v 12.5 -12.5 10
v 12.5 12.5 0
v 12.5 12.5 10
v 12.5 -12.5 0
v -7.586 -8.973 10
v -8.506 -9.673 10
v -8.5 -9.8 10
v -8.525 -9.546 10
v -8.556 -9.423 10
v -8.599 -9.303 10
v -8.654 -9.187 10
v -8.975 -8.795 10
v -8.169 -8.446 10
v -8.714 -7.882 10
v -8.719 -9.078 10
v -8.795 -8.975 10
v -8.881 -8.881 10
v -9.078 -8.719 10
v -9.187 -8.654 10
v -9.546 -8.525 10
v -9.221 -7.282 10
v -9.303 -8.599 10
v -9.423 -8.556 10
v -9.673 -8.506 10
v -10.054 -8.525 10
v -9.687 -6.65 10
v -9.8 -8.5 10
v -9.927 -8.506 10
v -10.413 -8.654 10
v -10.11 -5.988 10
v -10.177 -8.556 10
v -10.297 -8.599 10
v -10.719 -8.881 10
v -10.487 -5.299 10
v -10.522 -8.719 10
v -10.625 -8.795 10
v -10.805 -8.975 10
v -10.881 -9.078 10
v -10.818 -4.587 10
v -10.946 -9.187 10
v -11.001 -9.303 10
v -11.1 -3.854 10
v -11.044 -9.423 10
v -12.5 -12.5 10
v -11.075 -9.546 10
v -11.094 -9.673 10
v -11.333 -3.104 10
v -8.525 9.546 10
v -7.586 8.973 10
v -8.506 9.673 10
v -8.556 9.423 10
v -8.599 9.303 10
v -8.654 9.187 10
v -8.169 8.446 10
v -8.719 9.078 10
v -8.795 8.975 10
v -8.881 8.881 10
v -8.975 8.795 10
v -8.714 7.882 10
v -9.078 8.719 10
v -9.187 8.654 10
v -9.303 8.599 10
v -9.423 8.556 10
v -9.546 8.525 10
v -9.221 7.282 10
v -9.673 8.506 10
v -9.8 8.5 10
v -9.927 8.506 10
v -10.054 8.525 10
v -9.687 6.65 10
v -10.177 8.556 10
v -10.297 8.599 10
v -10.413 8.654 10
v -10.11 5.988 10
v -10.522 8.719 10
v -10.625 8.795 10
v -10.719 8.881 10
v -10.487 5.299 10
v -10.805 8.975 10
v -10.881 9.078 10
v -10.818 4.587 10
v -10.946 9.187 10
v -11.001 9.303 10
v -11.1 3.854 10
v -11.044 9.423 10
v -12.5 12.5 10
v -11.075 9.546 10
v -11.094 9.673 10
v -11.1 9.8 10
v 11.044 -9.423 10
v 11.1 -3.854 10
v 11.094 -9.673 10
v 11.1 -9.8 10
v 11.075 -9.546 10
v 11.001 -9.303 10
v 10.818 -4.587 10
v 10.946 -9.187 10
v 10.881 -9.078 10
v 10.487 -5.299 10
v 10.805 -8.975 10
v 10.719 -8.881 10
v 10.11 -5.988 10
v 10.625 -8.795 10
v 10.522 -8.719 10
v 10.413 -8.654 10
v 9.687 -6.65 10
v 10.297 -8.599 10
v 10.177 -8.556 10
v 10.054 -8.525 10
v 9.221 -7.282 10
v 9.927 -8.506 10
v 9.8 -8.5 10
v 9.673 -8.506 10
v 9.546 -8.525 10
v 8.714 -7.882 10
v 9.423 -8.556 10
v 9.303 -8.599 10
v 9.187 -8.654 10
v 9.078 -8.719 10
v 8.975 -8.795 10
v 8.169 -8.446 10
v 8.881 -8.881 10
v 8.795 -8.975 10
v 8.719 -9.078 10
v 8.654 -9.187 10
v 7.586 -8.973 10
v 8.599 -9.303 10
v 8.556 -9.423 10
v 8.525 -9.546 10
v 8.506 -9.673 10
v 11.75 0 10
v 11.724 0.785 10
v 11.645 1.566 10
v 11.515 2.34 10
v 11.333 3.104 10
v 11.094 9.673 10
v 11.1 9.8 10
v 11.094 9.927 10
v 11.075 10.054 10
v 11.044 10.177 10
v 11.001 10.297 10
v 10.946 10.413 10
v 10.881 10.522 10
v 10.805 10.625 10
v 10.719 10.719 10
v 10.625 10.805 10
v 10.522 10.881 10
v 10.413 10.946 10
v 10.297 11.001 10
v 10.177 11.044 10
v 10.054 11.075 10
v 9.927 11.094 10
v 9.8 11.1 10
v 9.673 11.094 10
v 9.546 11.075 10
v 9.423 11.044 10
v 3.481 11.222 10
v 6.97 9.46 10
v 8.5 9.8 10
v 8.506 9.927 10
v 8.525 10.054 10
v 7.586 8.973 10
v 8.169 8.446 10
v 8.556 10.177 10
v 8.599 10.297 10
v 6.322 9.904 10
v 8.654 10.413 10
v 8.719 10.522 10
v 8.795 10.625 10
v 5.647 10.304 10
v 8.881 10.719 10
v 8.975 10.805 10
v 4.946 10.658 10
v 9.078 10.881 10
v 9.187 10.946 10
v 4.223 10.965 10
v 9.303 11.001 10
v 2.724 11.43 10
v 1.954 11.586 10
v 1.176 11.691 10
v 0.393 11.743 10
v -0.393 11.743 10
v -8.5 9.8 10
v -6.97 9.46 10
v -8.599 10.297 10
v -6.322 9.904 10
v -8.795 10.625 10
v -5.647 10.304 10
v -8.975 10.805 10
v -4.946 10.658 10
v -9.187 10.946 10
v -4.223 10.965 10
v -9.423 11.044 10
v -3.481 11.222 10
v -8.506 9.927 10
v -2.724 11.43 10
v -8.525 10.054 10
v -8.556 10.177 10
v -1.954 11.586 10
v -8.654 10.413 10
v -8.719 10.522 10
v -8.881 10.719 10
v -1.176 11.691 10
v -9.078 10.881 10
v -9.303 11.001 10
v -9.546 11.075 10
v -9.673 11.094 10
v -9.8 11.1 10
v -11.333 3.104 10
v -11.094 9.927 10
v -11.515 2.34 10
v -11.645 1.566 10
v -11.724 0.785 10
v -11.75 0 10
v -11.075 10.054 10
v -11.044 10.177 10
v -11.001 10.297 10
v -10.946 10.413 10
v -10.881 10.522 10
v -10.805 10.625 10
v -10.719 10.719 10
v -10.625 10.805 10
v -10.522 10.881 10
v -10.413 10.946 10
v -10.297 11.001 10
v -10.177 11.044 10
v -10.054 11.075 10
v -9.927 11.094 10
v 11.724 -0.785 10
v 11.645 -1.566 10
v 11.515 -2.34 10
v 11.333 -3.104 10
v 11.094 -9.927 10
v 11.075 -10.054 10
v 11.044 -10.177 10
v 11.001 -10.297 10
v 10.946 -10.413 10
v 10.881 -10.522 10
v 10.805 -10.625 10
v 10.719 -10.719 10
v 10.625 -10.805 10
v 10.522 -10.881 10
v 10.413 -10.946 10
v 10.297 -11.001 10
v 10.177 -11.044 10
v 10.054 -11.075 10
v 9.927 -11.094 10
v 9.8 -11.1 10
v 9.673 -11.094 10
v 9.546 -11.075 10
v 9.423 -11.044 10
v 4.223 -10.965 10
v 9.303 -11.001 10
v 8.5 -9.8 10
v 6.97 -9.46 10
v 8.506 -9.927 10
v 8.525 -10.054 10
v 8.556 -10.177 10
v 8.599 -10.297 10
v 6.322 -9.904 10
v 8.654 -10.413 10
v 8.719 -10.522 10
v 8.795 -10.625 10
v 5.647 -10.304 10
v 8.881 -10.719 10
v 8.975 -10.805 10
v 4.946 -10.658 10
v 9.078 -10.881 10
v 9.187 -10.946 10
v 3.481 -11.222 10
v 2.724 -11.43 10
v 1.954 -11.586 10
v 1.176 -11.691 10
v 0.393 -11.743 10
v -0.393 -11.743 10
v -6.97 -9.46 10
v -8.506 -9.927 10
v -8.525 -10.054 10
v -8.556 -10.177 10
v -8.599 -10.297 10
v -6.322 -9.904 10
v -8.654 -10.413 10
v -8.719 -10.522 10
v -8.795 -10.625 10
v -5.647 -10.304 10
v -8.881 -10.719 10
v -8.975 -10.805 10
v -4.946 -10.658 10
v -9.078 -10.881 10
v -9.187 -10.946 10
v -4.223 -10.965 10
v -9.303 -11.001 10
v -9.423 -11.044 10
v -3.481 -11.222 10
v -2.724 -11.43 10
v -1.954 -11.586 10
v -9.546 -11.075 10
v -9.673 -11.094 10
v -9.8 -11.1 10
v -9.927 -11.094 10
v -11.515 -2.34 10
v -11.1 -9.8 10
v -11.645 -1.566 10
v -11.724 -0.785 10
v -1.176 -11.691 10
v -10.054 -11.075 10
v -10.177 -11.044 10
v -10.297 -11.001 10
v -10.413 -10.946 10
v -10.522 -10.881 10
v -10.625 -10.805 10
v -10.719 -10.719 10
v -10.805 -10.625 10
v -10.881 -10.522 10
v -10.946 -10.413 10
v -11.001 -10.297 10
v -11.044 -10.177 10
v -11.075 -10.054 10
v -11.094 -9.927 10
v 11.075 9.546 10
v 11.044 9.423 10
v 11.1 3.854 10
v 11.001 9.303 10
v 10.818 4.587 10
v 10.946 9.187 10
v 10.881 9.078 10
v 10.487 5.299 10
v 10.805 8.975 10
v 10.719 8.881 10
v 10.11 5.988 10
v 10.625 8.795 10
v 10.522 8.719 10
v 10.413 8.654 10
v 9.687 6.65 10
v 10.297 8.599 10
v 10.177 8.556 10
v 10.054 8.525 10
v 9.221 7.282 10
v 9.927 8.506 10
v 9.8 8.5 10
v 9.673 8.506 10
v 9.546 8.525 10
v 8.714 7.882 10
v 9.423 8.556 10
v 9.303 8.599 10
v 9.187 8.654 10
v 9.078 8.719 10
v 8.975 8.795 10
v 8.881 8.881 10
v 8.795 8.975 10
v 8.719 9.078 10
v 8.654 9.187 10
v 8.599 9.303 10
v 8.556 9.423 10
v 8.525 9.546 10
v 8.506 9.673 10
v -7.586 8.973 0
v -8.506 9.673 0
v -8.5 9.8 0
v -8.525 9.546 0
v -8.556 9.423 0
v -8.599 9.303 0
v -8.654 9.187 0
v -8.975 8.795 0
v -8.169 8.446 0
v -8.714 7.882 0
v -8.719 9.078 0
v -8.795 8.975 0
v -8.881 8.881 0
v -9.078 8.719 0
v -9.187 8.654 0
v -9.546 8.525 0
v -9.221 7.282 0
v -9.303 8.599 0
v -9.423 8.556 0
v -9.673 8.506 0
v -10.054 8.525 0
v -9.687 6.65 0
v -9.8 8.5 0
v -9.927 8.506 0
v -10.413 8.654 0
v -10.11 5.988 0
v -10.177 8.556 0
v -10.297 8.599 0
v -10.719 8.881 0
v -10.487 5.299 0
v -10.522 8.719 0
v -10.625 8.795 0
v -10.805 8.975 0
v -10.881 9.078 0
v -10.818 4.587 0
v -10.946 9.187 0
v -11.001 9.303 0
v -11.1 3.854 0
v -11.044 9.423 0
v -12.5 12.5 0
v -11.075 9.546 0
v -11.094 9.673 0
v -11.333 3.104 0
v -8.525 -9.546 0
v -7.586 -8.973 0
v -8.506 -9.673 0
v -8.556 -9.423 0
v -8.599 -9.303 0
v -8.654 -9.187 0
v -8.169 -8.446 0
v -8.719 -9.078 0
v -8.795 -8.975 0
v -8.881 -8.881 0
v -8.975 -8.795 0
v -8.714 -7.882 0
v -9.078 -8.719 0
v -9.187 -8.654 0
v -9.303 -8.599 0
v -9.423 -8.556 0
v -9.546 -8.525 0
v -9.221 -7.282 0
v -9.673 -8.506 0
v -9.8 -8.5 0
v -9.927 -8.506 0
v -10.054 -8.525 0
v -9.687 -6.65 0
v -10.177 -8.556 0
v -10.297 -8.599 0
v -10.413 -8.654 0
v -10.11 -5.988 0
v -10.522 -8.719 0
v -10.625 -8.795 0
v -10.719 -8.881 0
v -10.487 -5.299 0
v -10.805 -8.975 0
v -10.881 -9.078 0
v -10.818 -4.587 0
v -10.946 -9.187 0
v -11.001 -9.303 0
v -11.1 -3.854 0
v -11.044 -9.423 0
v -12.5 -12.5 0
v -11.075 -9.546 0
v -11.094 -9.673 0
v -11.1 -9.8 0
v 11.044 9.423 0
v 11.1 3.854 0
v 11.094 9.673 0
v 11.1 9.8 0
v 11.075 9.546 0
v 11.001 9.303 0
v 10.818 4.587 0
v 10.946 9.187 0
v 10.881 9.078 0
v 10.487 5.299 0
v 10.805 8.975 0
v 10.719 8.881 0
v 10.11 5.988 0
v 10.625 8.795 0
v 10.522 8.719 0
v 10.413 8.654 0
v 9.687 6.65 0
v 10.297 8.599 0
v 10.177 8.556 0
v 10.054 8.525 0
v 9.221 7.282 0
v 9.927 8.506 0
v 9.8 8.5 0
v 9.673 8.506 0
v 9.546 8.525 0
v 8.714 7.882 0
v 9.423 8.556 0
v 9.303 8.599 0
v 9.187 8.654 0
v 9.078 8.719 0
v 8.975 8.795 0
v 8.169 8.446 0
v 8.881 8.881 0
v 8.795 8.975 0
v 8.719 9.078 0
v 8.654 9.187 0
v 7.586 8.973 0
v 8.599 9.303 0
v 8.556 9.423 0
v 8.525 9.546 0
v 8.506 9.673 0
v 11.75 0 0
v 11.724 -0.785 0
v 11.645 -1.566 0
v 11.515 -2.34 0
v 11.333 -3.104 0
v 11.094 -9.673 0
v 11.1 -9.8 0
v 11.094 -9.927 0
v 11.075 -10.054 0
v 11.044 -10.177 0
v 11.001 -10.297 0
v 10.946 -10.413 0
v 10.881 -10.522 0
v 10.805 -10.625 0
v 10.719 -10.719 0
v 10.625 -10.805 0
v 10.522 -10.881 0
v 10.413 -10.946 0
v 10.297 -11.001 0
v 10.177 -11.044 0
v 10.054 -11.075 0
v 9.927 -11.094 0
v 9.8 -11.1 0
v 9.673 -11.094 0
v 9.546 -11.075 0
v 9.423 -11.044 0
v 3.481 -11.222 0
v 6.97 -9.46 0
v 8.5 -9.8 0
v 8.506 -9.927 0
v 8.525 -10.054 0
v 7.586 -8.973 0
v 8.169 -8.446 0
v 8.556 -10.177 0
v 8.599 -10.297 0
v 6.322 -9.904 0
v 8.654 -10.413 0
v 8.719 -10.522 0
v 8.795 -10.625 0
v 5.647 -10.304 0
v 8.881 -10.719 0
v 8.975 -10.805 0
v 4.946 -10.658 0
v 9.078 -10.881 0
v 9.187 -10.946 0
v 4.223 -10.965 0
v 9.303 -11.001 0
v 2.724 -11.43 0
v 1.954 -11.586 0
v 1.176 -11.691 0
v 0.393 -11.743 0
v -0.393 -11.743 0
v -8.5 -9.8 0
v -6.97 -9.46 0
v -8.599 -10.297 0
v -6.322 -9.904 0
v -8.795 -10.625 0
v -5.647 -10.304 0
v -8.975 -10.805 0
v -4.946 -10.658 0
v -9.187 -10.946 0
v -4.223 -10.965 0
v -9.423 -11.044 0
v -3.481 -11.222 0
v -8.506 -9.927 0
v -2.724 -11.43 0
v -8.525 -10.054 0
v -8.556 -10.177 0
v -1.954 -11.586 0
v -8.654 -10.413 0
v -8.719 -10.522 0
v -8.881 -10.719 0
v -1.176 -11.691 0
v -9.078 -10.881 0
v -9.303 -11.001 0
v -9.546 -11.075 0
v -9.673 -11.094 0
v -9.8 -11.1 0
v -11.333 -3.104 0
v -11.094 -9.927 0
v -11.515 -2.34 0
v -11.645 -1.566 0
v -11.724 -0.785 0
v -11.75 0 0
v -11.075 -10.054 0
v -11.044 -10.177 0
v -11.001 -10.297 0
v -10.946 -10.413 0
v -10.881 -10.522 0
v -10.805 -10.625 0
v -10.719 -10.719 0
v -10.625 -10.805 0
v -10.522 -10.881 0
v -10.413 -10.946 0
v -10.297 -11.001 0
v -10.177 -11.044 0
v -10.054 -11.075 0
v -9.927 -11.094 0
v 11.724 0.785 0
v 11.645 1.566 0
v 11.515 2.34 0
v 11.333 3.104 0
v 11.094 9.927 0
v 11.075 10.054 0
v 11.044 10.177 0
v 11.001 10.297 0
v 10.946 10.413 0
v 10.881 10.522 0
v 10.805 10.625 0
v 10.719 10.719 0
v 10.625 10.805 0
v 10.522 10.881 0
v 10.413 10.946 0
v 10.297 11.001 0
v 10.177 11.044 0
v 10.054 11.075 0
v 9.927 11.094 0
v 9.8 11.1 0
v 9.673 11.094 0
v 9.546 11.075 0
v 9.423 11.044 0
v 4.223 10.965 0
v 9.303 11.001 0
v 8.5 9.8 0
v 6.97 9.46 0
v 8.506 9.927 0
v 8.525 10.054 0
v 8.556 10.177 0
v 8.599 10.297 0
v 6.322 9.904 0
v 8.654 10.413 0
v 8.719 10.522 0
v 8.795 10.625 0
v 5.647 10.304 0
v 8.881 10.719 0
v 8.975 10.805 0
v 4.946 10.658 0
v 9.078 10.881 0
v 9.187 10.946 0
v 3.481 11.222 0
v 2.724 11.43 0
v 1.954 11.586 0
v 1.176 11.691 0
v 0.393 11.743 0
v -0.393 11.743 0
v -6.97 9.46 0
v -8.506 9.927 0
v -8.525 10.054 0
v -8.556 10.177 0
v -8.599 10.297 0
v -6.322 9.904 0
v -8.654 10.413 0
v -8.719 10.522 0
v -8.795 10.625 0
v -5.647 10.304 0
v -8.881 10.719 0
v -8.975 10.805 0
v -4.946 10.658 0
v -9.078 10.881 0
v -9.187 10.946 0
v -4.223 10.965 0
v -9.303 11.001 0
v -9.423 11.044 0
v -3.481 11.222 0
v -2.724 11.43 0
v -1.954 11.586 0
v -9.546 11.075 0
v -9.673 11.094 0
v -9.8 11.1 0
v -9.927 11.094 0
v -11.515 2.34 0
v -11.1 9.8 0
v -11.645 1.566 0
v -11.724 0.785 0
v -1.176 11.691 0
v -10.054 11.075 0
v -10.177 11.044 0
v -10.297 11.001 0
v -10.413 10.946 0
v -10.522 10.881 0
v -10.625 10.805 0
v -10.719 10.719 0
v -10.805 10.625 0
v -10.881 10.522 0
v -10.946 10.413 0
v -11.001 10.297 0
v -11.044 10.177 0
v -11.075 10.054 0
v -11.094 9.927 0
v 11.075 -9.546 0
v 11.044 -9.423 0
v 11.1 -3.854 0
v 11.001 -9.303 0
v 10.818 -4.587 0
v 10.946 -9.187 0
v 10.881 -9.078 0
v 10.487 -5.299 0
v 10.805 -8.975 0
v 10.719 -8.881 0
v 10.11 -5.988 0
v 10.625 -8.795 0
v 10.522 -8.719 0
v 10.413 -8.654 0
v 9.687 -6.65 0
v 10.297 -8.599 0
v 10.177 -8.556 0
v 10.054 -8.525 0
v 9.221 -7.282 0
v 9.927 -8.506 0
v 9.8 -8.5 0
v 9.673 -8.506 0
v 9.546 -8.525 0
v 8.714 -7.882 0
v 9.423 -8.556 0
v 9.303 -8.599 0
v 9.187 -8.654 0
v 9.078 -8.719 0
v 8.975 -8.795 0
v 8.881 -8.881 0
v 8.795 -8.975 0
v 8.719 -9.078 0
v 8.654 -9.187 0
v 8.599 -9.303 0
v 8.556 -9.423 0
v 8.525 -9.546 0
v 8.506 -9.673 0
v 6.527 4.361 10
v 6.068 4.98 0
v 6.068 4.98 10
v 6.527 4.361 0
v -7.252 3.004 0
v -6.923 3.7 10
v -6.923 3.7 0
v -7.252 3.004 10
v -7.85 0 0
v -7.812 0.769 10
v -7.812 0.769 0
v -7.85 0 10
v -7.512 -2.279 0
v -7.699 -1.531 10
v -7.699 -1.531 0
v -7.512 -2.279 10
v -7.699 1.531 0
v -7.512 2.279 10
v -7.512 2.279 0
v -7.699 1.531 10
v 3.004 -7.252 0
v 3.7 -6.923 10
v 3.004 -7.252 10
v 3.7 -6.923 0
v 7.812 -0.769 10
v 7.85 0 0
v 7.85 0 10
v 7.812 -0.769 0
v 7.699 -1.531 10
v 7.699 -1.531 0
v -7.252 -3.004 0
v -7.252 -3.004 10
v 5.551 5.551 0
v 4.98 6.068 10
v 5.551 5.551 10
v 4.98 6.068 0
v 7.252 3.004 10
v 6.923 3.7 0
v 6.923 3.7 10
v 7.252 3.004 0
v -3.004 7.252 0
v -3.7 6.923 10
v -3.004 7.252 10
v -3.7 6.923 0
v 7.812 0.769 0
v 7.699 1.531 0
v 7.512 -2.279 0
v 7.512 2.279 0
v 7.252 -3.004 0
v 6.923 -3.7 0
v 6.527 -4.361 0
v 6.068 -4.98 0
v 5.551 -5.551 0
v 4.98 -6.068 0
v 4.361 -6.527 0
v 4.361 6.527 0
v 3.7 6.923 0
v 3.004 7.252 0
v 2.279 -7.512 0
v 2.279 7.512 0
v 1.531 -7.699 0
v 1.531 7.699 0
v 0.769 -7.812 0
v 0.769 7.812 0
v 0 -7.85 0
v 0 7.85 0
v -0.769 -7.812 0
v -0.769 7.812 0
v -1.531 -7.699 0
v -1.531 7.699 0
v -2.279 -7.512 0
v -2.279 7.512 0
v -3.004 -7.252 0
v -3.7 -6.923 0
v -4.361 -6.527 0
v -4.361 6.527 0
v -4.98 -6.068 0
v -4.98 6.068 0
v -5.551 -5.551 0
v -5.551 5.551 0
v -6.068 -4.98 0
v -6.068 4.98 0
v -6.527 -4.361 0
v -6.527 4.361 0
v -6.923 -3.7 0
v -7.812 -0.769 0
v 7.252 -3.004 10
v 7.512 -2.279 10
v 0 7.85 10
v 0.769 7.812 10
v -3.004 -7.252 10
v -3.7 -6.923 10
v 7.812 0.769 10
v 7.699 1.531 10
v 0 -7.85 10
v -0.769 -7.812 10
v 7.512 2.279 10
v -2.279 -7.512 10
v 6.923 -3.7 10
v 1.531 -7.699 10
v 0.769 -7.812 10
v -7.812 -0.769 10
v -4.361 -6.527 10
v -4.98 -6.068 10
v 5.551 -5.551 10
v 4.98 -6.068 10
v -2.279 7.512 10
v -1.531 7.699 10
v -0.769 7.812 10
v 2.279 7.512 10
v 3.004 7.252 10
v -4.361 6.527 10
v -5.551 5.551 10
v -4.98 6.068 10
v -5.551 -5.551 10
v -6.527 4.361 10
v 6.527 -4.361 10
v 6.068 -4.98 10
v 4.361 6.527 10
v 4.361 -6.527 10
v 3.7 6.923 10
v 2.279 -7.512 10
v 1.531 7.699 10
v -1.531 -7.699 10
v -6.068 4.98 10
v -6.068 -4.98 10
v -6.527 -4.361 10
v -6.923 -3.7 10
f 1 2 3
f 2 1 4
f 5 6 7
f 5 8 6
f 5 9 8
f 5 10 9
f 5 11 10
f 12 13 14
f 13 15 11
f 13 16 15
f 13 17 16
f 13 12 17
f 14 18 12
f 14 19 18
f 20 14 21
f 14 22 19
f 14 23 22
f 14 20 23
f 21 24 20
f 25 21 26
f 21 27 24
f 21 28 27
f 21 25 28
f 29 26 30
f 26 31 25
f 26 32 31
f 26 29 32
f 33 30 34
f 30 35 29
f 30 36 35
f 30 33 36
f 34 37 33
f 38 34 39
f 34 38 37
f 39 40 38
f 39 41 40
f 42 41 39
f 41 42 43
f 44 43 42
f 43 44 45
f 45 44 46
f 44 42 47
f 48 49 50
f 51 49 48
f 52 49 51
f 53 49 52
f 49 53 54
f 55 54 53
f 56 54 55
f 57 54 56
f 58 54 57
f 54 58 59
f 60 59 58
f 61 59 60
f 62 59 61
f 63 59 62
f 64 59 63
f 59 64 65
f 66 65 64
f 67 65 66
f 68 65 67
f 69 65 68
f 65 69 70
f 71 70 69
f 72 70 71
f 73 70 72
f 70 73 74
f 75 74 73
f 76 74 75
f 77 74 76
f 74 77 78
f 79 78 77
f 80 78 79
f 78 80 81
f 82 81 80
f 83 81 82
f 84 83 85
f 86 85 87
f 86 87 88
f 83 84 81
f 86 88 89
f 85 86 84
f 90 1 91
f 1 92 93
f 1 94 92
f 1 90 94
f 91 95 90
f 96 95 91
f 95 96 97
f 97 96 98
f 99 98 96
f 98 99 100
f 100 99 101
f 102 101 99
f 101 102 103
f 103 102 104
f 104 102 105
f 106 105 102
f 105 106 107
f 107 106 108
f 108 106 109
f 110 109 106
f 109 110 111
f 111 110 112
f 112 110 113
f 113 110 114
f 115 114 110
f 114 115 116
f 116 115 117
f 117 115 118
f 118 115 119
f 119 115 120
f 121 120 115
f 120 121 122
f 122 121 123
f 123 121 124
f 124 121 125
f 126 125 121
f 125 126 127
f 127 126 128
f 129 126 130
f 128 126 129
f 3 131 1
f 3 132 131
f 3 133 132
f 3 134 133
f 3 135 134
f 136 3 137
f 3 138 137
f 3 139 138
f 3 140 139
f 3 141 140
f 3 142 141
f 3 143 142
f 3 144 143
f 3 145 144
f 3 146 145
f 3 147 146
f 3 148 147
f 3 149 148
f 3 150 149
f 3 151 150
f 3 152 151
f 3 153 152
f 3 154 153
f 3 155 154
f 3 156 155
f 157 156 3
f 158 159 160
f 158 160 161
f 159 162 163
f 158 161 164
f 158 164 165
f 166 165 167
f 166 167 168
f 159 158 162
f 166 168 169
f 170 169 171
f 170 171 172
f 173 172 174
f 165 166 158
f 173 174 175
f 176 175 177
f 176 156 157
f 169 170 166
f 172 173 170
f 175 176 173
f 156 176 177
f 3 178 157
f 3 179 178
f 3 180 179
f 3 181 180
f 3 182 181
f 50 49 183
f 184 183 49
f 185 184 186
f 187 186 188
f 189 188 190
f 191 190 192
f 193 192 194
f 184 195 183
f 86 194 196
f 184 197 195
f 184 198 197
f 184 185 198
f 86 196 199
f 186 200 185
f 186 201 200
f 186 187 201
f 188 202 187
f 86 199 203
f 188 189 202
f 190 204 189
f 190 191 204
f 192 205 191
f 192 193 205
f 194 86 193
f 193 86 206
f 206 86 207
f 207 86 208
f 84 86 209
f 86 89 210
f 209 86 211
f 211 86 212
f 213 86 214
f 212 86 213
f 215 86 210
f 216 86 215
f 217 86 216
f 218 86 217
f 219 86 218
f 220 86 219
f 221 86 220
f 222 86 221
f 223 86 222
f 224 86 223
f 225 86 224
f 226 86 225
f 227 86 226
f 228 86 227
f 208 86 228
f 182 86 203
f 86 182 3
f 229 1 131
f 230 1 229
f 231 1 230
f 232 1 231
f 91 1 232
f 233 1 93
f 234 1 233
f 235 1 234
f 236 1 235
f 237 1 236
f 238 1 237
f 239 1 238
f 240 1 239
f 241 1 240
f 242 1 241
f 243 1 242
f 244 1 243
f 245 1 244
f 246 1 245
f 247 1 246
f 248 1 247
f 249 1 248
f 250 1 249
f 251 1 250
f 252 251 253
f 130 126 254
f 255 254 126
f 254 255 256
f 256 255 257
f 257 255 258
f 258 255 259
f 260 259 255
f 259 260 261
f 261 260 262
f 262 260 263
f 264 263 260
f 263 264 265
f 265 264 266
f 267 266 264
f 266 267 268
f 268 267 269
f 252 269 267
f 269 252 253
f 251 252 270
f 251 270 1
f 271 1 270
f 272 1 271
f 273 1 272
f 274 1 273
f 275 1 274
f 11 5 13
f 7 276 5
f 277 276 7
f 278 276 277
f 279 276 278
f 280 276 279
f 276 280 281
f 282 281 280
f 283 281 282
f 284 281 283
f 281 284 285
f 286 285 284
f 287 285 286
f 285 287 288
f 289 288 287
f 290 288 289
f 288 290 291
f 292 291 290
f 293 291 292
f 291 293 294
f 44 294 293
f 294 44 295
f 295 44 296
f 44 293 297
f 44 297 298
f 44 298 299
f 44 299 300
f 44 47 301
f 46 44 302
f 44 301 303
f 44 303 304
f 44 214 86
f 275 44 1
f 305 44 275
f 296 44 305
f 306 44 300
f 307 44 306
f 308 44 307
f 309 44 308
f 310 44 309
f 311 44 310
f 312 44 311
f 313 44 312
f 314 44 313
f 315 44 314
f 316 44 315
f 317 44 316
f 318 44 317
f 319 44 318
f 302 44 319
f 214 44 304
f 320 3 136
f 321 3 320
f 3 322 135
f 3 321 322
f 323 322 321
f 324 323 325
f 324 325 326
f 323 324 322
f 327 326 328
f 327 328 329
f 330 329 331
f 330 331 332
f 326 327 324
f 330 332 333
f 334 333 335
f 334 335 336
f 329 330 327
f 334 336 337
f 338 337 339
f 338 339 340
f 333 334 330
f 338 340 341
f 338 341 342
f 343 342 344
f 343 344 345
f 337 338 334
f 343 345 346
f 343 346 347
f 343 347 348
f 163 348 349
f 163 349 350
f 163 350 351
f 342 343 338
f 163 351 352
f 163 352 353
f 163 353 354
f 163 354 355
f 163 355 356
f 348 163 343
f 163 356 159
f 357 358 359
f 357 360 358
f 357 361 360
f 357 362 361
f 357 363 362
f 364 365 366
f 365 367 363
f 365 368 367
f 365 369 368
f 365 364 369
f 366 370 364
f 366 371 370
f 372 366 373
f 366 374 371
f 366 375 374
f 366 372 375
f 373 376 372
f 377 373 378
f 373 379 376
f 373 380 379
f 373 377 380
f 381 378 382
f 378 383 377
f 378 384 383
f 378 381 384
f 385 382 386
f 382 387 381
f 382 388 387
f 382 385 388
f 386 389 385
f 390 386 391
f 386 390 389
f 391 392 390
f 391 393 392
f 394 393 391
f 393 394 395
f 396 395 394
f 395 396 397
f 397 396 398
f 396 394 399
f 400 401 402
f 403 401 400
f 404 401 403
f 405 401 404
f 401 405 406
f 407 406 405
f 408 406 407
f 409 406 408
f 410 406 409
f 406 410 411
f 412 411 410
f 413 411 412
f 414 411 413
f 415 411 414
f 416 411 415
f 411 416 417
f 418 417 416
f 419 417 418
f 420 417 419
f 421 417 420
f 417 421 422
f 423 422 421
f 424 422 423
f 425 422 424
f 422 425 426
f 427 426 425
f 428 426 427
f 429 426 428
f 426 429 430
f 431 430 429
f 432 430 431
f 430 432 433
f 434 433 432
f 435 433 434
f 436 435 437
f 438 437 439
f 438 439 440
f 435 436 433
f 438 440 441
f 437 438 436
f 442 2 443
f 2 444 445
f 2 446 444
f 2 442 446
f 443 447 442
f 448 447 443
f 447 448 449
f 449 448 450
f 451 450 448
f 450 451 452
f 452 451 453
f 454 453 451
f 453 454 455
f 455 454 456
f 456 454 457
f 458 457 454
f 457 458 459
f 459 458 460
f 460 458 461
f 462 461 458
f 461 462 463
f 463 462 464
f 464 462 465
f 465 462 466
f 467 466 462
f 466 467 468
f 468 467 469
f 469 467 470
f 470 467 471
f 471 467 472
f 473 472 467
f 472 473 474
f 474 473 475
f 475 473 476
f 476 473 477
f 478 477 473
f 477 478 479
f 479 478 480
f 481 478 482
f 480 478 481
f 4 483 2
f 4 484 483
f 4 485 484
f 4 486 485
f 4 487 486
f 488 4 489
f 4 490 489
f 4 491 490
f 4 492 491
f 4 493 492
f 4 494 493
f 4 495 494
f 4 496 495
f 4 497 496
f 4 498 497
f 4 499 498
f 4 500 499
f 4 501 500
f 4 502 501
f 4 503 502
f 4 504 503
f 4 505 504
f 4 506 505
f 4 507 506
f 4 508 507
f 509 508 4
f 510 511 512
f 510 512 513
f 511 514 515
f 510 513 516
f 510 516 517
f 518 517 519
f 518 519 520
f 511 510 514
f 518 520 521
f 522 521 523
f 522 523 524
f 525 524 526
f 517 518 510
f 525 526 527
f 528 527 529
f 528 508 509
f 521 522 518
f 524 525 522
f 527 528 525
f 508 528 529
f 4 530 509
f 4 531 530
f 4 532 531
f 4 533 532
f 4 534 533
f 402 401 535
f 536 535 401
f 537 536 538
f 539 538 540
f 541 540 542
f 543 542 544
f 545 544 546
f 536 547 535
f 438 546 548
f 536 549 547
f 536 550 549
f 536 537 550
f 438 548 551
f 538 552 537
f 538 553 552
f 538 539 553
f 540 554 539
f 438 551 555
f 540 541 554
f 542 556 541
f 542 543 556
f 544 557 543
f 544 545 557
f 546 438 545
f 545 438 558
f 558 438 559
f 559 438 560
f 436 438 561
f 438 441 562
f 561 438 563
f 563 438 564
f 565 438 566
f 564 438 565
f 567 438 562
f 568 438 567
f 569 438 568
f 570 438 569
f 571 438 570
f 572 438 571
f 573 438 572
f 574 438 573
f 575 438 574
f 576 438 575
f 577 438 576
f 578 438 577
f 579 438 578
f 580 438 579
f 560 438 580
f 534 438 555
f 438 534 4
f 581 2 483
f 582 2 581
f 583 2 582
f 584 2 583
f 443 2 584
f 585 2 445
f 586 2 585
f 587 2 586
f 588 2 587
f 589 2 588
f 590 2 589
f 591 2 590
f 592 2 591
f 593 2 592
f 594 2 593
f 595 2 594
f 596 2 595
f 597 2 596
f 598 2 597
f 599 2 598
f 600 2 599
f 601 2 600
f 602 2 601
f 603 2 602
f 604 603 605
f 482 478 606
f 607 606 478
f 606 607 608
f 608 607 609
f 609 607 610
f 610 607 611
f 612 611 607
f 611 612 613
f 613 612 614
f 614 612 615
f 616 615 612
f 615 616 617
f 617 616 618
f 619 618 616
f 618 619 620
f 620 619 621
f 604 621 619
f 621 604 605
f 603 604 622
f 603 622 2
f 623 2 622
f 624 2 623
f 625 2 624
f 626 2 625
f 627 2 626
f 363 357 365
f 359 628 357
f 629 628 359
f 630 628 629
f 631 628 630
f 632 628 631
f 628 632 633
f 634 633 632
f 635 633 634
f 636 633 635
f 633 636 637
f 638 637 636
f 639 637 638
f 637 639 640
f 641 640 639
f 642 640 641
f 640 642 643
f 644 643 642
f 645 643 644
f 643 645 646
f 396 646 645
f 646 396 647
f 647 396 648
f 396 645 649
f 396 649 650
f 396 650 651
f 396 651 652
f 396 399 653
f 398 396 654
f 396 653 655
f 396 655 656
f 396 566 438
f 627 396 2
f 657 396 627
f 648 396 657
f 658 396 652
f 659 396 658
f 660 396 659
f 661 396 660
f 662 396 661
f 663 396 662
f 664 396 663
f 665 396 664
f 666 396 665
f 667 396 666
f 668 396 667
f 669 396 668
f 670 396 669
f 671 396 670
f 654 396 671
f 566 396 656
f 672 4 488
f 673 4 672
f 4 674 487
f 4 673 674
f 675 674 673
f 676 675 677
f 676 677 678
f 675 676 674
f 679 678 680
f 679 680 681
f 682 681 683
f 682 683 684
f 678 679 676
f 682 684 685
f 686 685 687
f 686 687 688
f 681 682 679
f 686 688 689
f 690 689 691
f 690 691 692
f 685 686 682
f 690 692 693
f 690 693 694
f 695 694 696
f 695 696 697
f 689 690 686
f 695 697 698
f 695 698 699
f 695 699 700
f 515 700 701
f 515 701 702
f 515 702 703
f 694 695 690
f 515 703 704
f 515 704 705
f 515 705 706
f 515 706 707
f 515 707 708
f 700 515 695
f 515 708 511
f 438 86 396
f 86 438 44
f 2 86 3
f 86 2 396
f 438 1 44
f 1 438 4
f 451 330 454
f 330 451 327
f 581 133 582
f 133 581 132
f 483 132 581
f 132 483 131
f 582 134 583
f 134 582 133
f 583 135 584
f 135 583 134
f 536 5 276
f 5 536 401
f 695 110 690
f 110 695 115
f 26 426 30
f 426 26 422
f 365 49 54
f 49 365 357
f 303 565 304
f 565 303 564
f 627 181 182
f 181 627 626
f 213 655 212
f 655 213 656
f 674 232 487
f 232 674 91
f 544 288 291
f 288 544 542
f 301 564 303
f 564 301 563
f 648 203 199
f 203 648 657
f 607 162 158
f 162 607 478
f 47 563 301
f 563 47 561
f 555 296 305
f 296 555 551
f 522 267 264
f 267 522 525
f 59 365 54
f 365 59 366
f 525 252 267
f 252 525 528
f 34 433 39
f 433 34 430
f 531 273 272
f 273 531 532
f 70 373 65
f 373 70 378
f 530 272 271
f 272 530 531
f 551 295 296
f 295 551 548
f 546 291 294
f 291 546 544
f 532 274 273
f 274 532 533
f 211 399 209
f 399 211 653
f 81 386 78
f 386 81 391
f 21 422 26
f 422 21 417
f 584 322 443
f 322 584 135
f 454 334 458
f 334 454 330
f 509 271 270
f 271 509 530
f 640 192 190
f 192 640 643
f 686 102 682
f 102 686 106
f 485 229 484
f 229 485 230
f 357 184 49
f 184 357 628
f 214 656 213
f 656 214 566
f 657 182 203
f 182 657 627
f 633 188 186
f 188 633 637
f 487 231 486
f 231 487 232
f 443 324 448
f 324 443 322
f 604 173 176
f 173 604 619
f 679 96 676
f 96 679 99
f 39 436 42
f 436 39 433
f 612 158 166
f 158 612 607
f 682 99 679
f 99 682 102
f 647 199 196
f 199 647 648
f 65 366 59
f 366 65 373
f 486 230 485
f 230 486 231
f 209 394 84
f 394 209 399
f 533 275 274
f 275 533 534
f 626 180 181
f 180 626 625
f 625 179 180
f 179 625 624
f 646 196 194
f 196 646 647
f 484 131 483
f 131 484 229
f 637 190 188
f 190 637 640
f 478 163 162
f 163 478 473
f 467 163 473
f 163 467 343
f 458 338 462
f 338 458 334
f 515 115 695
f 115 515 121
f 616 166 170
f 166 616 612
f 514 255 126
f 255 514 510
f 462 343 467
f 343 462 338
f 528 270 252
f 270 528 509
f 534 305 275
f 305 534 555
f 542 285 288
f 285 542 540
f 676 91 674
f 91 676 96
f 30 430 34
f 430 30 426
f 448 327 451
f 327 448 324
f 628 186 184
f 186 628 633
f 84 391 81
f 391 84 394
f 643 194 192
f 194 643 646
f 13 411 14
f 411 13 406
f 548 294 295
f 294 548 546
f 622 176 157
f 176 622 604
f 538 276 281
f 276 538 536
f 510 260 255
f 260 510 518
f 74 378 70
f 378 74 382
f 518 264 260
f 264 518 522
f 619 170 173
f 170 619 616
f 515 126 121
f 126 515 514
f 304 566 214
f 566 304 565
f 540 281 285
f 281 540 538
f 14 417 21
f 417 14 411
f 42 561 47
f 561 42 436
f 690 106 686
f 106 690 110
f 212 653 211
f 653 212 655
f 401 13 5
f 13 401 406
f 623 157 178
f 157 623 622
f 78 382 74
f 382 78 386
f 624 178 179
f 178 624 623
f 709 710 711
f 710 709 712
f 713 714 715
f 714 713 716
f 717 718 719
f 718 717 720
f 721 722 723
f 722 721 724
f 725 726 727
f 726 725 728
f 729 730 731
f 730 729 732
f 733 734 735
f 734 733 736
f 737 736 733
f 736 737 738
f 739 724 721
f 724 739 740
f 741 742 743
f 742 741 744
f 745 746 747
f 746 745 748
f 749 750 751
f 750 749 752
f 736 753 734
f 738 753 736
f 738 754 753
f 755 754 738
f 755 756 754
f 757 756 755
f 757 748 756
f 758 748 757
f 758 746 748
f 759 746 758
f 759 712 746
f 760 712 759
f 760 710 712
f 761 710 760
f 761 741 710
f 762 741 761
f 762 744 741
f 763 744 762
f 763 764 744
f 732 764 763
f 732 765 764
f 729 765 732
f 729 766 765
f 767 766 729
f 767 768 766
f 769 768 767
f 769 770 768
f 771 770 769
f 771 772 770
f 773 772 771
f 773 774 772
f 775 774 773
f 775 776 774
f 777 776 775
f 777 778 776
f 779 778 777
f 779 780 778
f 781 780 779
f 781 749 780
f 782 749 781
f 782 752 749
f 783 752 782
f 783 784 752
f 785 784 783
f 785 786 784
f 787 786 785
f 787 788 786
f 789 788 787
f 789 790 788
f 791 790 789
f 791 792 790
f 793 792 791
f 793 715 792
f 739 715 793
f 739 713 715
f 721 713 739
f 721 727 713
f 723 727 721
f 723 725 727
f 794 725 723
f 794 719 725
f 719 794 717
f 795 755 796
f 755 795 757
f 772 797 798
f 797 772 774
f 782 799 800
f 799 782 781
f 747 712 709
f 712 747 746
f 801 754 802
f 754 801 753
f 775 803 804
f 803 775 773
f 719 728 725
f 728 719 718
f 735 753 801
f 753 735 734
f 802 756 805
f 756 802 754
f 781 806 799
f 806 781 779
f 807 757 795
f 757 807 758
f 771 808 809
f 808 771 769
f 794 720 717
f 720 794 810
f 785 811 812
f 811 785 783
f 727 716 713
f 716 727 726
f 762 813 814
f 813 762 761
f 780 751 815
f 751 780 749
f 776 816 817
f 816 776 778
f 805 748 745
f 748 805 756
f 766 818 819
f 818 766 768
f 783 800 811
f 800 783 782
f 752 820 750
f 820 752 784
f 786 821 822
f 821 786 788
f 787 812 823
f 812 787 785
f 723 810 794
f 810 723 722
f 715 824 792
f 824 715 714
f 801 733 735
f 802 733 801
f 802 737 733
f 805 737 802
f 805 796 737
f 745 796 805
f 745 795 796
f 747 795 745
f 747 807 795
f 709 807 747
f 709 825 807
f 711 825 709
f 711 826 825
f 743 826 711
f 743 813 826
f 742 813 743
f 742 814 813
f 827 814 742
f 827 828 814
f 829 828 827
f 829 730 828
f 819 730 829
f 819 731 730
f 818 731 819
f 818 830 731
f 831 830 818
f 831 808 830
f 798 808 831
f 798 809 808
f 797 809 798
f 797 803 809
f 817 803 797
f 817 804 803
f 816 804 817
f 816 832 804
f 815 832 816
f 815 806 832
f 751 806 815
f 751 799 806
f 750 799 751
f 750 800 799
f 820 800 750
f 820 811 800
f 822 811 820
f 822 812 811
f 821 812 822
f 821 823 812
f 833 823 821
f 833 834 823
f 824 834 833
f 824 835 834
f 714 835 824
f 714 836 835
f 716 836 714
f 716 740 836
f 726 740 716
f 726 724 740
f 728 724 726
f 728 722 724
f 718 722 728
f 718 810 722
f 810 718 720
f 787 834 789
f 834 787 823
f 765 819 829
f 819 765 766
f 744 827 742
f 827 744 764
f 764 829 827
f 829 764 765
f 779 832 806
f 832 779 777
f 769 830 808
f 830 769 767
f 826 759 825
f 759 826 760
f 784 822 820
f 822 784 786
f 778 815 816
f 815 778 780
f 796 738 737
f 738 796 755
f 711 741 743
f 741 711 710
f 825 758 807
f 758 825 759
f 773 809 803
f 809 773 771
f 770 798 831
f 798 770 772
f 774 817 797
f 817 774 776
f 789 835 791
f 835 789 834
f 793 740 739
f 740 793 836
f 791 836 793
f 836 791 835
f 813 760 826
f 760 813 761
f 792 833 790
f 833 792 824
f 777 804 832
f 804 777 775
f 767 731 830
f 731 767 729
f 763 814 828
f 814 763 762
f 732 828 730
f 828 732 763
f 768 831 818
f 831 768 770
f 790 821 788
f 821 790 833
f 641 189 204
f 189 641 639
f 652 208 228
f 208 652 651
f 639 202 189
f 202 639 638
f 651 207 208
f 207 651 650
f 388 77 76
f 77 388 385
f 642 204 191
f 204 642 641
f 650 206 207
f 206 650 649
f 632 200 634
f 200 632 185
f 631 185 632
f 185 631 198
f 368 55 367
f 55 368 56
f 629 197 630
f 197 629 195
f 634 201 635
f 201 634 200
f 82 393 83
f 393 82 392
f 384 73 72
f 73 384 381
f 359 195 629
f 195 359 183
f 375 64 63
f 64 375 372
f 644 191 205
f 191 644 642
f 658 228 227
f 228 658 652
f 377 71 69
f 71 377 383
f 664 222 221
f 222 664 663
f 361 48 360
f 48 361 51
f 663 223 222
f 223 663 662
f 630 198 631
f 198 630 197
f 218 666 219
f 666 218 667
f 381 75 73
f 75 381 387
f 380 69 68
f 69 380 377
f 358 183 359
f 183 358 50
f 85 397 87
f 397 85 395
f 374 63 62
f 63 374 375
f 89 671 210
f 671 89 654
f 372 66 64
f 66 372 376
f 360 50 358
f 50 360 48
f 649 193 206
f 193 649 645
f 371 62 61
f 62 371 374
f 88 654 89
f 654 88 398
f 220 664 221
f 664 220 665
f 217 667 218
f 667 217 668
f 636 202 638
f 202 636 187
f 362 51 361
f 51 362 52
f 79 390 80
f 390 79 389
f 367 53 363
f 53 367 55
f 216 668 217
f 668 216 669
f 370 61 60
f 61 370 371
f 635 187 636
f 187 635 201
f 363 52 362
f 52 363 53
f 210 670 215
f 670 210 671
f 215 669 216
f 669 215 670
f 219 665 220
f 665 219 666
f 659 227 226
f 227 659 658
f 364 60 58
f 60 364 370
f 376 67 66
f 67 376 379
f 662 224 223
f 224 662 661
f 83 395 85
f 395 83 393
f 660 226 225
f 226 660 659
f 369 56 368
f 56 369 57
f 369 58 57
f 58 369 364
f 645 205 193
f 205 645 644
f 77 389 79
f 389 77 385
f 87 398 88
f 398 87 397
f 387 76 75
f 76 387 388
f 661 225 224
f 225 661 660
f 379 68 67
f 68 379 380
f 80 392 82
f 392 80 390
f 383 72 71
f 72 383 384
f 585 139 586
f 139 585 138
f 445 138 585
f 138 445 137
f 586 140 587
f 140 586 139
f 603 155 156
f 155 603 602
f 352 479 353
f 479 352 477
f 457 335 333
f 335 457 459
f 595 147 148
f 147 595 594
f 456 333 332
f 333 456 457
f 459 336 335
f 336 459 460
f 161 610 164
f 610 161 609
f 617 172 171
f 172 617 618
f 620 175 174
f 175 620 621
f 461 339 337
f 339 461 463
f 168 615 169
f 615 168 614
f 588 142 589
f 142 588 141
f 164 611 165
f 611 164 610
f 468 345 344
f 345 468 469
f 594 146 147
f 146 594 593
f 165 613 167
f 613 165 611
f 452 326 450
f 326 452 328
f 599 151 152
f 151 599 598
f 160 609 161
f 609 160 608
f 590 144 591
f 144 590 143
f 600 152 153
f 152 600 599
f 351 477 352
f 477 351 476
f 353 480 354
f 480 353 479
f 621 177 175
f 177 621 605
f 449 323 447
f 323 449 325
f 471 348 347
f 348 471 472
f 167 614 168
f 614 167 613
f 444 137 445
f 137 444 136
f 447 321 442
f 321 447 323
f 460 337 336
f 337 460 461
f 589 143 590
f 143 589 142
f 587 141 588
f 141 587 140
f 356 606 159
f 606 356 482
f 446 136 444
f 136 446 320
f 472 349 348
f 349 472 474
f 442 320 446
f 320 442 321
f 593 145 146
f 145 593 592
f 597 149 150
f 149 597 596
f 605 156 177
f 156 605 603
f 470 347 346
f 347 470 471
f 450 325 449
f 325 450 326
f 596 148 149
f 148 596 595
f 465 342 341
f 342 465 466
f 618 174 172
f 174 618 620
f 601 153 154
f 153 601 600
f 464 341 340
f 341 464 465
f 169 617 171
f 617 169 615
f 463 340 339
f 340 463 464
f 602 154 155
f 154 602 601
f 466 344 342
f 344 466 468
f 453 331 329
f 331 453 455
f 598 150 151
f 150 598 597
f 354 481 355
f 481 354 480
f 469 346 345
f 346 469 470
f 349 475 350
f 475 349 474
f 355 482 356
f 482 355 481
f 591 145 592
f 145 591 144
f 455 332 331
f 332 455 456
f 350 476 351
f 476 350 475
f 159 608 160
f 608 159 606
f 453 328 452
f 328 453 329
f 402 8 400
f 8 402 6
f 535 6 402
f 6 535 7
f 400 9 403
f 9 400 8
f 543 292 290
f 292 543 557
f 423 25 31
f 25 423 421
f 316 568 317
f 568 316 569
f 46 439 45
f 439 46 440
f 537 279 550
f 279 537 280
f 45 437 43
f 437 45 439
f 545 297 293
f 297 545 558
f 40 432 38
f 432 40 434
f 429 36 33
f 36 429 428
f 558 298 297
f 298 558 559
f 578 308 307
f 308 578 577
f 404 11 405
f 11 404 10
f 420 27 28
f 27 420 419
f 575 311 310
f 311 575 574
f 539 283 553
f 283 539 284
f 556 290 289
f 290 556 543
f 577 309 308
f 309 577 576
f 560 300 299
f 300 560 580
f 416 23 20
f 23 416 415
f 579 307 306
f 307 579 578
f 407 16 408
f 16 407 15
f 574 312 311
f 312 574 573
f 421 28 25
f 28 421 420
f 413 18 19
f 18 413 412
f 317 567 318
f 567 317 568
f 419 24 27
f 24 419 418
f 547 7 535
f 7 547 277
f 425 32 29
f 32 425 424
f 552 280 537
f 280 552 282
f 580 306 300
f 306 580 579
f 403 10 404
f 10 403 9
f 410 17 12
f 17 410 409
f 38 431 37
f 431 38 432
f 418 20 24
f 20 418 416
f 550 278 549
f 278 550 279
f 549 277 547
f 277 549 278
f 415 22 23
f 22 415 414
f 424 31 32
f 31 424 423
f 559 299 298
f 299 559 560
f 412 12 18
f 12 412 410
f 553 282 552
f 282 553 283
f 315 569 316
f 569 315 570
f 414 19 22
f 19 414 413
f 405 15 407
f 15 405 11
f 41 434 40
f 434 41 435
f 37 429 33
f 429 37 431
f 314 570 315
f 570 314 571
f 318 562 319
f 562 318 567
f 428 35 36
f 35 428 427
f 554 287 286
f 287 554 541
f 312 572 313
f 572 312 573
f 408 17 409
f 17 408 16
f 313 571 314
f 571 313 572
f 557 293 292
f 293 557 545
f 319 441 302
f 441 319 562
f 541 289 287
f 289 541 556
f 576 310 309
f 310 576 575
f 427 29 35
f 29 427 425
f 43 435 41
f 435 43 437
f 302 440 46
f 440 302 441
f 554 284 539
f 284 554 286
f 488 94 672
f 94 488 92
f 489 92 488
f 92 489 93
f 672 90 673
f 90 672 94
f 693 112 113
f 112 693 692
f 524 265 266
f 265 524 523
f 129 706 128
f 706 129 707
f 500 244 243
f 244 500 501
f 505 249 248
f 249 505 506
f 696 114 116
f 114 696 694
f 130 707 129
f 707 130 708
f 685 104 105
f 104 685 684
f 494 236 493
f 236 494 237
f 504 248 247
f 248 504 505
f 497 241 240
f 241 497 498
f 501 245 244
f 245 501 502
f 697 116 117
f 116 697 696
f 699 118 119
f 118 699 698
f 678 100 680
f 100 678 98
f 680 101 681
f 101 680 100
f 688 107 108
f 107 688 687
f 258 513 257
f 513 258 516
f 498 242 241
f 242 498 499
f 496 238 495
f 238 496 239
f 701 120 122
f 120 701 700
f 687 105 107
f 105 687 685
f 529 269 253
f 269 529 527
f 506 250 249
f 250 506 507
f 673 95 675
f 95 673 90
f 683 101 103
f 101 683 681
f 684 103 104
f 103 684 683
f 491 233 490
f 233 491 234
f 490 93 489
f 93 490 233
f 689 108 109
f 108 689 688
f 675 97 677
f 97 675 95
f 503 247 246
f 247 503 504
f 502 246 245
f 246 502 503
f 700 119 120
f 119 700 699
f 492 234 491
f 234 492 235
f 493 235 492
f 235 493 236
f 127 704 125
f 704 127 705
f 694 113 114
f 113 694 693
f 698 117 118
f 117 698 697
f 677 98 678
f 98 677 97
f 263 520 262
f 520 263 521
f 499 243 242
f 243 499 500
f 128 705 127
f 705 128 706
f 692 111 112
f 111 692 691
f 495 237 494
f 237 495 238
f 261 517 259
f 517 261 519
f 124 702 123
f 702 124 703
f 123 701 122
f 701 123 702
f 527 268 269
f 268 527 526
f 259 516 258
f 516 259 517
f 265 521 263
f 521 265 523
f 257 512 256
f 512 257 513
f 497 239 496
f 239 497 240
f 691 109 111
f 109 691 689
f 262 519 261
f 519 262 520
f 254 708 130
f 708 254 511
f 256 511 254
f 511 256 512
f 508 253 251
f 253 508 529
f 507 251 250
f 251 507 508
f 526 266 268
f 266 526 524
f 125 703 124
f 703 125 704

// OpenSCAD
module Fan(){
  difference(){
    union(){
      difference(){
        translate([-12.5, -12.5, 0])cube([25, 25, 10]);
        translate([0, 0, -0.1])cylinder(d=23.5,h=10.2,$fn=94);
      }

      cylinder(d=15.7,h=10,$fn=64);
    }

    translate([-9.8, 9.8, -0.1])cylinder(d=2.6,h=10.2,$fn=64);
    translate([9.8, 9.8, -0.1])cylinder(d=2.6,h=10.2,$fn=64);
    translate([-9.8, -9.8, -0.1])cylinder(d=2.6,h=10.2,$fn=64);
    translate([9.8, -9.8, -0.1])cylinder(d=2.6,h=10.2,$fn=64);
  }
}
$fn=64;
color("black")Fan();
